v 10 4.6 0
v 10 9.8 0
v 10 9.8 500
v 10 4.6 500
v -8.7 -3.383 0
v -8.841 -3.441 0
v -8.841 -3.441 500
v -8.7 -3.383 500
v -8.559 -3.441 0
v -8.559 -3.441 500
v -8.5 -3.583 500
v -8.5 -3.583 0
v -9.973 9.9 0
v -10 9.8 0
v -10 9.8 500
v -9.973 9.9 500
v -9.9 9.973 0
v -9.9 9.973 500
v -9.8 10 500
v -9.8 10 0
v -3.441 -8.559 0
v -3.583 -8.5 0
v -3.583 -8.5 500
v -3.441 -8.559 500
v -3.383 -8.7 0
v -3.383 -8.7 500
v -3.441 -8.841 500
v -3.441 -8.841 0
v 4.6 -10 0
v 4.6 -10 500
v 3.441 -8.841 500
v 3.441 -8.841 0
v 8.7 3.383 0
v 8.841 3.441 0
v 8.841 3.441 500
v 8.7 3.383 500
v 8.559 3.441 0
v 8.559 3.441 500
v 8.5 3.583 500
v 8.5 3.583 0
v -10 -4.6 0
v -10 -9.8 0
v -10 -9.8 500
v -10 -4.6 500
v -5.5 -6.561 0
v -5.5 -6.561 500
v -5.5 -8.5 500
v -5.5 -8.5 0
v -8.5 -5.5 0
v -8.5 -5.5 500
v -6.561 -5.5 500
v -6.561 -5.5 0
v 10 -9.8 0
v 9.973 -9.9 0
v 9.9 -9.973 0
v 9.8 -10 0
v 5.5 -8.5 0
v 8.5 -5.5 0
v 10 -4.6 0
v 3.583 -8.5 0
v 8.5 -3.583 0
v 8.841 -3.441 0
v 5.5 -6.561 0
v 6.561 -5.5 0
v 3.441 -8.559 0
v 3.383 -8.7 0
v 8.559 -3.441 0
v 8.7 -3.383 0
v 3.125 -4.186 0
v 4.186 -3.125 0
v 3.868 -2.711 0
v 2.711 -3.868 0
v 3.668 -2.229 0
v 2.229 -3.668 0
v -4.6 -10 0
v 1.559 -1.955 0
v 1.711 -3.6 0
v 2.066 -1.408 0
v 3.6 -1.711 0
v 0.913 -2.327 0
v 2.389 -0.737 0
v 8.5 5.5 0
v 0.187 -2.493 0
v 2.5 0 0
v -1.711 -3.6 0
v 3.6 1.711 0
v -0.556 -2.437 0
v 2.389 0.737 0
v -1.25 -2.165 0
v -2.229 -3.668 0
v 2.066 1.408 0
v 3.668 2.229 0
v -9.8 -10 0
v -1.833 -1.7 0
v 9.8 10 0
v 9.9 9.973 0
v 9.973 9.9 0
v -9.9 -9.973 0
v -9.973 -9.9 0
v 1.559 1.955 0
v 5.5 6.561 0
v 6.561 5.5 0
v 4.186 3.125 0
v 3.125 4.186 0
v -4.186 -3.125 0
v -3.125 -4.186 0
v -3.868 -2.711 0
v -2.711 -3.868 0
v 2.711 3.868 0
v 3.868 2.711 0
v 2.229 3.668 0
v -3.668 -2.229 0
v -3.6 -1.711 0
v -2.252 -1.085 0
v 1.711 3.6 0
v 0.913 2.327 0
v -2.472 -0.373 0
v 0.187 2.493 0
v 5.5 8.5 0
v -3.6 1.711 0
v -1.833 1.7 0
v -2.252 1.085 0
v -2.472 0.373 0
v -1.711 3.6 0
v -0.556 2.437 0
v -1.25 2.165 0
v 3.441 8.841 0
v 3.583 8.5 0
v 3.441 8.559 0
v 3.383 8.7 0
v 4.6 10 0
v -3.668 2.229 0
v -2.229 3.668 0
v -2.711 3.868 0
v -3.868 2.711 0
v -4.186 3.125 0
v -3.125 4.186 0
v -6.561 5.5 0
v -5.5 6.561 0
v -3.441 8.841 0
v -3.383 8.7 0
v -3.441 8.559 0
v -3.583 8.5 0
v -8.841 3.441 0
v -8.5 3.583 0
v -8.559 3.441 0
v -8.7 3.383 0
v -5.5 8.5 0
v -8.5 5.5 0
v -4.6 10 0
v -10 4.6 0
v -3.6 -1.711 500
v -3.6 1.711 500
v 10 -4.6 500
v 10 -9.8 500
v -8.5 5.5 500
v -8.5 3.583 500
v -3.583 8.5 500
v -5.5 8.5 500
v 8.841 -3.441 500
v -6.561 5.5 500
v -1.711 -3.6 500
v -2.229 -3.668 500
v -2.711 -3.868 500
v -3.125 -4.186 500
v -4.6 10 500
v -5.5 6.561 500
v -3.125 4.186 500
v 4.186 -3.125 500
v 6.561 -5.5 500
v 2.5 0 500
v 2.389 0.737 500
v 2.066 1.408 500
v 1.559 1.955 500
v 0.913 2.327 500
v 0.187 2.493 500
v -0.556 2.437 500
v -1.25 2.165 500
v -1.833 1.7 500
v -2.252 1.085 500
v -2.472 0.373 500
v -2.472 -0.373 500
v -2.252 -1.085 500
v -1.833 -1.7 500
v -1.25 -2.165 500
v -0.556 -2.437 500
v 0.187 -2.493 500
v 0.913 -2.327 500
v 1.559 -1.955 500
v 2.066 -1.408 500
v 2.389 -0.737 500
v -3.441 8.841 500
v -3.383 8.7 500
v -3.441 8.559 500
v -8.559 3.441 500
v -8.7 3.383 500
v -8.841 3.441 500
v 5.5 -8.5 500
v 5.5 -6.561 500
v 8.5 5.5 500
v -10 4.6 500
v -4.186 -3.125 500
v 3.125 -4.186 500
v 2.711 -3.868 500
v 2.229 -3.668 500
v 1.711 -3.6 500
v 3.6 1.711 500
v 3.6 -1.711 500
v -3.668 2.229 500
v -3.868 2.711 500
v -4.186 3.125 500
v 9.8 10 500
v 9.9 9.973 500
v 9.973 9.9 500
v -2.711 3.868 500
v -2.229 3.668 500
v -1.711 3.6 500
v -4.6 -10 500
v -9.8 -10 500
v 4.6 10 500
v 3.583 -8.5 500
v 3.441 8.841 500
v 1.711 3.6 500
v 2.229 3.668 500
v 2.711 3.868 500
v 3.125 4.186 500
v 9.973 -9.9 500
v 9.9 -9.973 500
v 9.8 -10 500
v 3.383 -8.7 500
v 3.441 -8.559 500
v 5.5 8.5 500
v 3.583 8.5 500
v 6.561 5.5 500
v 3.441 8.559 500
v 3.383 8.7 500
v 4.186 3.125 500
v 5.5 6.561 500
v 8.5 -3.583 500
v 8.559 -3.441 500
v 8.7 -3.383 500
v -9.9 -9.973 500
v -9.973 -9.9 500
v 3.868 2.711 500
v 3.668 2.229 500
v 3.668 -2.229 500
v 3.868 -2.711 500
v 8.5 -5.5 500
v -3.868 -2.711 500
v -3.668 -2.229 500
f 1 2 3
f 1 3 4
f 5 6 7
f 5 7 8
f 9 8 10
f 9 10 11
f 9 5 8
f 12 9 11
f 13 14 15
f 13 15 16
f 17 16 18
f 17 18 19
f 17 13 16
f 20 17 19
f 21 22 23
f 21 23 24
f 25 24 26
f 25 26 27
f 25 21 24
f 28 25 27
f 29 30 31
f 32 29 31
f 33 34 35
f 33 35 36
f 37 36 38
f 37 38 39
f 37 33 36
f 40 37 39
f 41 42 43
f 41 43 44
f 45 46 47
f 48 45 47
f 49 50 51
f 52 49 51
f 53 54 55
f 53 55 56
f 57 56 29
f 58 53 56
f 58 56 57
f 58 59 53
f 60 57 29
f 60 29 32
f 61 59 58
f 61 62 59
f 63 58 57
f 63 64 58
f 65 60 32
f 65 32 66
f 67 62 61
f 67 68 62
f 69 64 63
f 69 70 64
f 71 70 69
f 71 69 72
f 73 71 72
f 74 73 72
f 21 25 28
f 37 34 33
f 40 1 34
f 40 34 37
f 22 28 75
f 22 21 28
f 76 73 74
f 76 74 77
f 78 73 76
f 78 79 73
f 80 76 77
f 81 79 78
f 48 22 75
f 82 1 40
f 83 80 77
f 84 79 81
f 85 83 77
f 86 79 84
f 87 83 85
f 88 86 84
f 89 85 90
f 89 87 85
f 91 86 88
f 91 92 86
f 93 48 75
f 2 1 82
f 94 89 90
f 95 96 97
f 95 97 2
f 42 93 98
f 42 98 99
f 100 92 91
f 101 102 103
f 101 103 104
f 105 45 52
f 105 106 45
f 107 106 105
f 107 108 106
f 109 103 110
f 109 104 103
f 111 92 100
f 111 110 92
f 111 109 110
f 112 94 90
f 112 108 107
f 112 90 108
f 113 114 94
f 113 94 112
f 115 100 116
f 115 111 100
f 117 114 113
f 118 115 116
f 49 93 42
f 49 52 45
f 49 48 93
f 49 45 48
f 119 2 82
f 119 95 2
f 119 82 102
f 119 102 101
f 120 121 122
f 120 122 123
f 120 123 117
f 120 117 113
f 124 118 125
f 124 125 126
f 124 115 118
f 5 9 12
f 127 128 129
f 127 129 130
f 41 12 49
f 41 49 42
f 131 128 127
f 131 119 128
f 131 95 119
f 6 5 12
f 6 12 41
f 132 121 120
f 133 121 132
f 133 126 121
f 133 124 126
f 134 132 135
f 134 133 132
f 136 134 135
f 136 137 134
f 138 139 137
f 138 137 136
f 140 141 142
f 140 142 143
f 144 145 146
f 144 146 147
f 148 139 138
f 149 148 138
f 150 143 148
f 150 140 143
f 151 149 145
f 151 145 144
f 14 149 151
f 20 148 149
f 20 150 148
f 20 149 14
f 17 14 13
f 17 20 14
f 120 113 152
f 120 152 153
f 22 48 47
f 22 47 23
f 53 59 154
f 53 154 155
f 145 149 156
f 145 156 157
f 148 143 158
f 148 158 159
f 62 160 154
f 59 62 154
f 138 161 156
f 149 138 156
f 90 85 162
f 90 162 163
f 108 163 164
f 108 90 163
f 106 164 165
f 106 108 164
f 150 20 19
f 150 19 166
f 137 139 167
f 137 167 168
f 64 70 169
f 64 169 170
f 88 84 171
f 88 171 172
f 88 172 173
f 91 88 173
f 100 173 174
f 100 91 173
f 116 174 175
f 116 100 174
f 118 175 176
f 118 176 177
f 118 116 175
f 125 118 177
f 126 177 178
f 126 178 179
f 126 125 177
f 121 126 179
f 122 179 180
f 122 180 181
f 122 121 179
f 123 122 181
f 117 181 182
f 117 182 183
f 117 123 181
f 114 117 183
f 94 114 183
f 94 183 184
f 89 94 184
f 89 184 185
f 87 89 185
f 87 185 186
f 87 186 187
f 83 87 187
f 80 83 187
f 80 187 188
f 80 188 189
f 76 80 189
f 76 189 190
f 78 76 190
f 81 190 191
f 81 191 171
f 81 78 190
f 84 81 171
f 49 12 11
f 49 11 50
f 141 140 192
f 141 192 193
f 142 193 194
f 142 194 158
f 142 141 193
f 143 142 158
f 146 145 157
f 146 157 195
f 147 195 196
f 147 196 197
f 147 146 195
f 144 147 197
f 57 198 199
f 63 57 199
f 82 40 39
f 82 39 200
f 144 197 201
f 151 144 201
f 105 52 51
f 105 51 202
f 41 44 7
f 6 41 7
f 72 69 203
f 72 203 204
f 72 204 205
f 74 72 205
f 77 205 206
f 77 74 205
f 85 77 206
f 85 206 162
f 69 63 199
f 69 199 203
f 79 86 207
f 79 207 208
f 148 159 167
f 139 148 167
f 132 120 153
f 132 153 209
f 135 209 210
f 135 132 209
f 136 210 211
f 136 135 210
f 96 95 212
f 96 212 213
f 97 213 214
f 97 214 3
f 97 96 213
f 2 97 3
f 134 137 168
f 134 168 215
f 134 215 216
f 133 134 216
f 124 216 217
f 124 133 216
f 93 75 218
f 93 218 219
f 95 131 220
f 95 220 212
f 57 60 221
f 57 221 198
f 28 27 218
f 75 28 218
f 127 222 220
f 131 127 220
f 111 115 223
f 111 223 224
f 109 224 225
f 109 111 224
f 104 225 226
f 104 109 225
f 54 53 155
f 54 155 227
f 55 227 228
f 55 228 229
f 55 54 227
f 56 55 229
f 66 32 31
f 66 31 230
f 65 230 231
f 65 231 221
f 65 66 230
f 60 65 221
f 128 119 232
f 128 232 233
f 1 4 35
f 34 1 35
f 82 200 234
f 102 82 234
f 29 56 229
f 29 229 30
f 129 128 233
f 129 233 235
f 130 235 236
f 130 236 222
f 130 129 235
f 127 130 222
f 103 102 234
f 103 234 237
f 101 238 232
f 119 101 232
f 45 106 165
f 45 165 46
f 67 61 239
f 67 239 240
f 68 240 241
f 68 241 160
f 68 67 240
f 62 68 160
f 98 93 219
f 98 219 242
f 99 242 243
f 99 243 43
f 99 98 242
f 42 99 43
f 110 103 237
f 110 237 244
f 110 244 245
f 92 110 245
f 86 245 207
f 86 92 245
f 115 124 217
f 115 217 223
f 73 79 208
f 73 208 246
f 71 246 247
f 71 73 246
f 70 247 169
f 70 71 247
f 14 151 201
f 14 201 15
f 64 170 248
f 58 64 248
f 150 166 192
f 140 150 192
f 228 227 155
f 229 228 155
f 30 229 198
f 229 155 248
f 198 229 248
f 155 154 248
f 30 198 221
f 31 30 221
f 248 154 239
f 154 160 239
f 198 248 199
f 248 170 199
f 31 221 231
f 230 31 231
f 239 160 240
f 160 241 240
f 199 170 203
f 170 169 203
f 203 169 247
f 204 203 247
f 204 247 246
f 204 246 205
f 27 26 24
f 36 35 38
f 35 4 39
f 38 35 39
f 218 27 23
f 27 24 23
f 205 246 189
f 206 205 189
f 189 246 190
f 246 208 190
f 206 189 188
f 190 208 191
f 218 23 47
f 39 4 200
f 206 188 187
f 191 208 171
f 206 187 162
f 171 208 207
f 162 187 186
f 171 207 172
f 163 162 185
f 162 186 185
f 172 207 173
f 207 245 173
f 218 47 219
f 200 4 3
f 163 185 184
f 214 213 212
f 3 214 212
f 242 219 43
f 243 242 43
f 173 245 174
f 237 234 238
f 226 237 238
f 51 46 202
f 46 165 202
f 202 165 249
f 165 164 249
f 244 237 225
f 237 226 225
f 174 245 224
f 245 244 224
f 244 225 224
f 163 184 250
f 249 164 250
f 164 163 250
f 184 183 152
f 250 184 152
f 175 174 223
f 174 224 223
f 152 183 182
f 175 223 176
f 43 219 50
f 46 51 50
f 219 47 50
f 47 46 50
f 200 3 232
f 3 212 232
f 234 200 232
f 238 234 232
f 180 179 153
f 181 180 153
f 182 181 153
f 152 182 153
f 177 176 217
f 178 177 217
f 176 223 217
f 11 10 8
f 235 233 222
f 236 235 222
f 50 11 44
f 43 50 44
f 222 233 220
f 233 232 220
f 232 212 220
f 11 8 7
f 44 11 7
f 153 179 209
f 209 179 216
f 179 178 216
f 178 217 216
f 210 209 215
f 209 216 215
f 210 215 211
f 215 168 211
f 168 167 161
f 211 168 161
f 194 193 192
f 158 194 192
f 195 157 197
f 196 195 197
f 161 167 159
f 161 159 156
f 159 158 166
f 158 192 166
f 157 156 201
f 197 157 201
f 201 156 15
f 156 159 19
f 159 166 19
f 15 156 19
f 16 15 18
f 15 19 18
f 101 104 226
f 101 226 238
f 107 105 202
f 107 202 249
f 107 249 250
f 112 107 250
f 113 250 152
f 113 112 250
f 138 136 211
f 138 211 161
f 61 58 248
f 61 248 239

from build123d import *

# Parameters (mm, degrees)
ESBO_O1_R                = 2.5
RESSALTO_EXTRUS_O1_DEPTH = 500


with BuildPart() as part:
    # Esboço1 → Ressalto-extrusão1 (new body)
    with BuildSketch(Plane.XY):
        with BuildLine():
            Line((-4.6, -10), (-9.8, -10))
            ThreePointArc((-9.8, -10), (-9.941421356, -9.941421356), (-10, -9.8))
            Line((-10, -9.8), (-10, -4.6))
            Line((-10, -4.6), (-8.841421356, -3.441421356))
            ThreePointArc((-8.841421356, -3.441421356), (-8.623463314, -3.398066806), (-8.5, -3.582842712))
            Line((-8.5, -3.582842712), (-8.5, -5.5))
            Line((-8.5, -5.5), (-6.560660172, -5.5))
            Line((-6.560660172, -5.5), (-4.185786438, -3.125126266))
            ThreePointArc((-4.185786438, -3.125126266), (-3.752240935, -2.476279568), (-3.6, -1.710912703))
            Line((-3.6, -1.710912703), (-3.6, 1.710912703))
            ThreePointArc((-3.6, 1.710912703), (-3.752240935, 2.476279568), (-4.185786438, 3.125126266))
            Line((-4.185786438, 3.125126266), (-6.560660172, 5.5))
            Line((-6.560660172, 5.5), (-8.5, 5.5))
            Line((-8.5, 5.5), (-8.5, 3.582842712))
            ThreePointArc((-8.5, 3.582842712), (-8.623463314, 3.398066806), (-8.841421356, 3.441421356))
            Line((-8.841421356, 3.441421356), (-10, 4.6))
            Line((-10, 4.6), (-10, 9.8))
            ThreePointArc((-10, 9.8), (-9.941421356, 9.941421356), (-9.8, 10))
            Line((-9.8, 10), (-4.6, 10))
            Line((-4.6, 10), (-3.441421356, 8.841421356))
            ThreePointArc((-3.441421356, 8.841421356), (-3.398066806, 8.623463314), (-3.582842712, 8.5))
            Line((-3.582842712, 8.5), (-5.5, 8.5))
            Line((-5.5, 8.5), (-5.5, 6.560660172))
            Line((-5.5, 6.560660172), (-3.125126266, 4.185786438))
            ThreePointArc((-3.125126266, 4.185786438), (-2.476279568, 3.752240935), (-1.710912703, 3.6))
            Line((-1.710912703, 3.6), (1.710912703, 3.6))
            ThreePointArc((1.710912703, 3.6), (2.476279568, 3.752240935), (3.125126266, 4.185786438))
            Line((3.125126266, 4.185786438), (5.5, 6.560660172))
            Line((5.5, 6.560660172), (5.5, 8.5))
            Line((5.5, 8.5), (3.582842712, 8.5))
            ThreePointArc((3.582842712, 8.5), (3.398066806, 8.623463314), (3.441421356, 8.841421356))
            Line((3.441421356, 8.841421356), (4.6, 10))
            Line((4.6, 10), (9.8, 10))
            ThreePointArc((9.8, 10), (9.941421356, 9.941421356), (10, 9.8))
            Line((10, 9.8), (10, 4.6))
            Line((10, 4.6), (8.841421356, 3.441421356))
            ThreePointArc((8.841421356, 3.441421356), (8.623463314, 3.398066806), (8.5, 3.582842712))
            Line((8.5, 3.582842712), (8.5, 5.5))
            Line((8.5, 5.5), (6.560660172, 5.5))
            Line((6.560660172, 5.5), (4.185786438, 3.125126266))
            ThreePointArc((4.185786438, 3.125126266), (3.752240935, 2.476279568), (3.6, 1.710912703))
            Line((3.6, 1.710912703), (3.6, -1.710912703))
            ThreePointArc((3.6, -1.710912703), (3.752240935, -2.476279568), (4.185786438, -3.125126266))
            Line((4.185786438, -3.125126266), (6.560660172, -5.5))
            Line((6.560660172, -5.5), (8.5, -5.5))
            Line((8.5, -5.5), (8.5, -3.582842712))
            ThreePointArc((8.5, -3.582842712), (8.623463314, -3.398066806), (8.841421356, -3.441421356))
            Line((8.841421356, -3.441421356), (10, -4.6))
            Line((10, -4.6), (10, -9.8))
            ThreePointArc((10, -9.8), (9.941421356, -9.941421356), (9.8, -10))
            Line((9.8, -10), (4.6, -10))
            Line((4.6, -10), (3.441421356, -8.841421356))
            ThreePointArc((3.441421356, -8.841421356), (3.398066806, -8.623463314), (3.582842712, -8.5))
            Line((3.582842712, -8.5), (5.5, -8.5))
            Line((5.5, -8.5), (5.5, -6.560660172))
            Line((5.5, -6.560660172), (3.125126266, -4.185786438))
            ThreePointArc((3.125126266, -4.185786438), (2.476279568, -3.752240935), (1.710912703, -3.6))
            Line((1.710912703, -3.6), (-1.710912703, -3.6))
            ThreePointArc((-1.710912703, -3.6), (-2.476279568, -3.752240935), (-3.125126266, -4.185786438))
            Line((-3.125126266, -4.185786438), (-5.5, -6.560660172))
            Line((-5.5, -6.560660172), (-5.5, -8.5))
            Line((-5.5, -8.5), (-3.582842712, -8.5))
            ThreePointArc((-3.582842712, -8.5), (-3.398066806, -8.623463314), (-3.441421356, -8.841421356))
            Line((-3.441421356, -8.841421356), (-4.6, -10))
        make_face()
        Circle(ESBO_O1_R, mode=Mode.SUBTRACT)
    extrude(amount=RESSALTO_EXTRUS_O1_DEPTH)


solid = part.part
